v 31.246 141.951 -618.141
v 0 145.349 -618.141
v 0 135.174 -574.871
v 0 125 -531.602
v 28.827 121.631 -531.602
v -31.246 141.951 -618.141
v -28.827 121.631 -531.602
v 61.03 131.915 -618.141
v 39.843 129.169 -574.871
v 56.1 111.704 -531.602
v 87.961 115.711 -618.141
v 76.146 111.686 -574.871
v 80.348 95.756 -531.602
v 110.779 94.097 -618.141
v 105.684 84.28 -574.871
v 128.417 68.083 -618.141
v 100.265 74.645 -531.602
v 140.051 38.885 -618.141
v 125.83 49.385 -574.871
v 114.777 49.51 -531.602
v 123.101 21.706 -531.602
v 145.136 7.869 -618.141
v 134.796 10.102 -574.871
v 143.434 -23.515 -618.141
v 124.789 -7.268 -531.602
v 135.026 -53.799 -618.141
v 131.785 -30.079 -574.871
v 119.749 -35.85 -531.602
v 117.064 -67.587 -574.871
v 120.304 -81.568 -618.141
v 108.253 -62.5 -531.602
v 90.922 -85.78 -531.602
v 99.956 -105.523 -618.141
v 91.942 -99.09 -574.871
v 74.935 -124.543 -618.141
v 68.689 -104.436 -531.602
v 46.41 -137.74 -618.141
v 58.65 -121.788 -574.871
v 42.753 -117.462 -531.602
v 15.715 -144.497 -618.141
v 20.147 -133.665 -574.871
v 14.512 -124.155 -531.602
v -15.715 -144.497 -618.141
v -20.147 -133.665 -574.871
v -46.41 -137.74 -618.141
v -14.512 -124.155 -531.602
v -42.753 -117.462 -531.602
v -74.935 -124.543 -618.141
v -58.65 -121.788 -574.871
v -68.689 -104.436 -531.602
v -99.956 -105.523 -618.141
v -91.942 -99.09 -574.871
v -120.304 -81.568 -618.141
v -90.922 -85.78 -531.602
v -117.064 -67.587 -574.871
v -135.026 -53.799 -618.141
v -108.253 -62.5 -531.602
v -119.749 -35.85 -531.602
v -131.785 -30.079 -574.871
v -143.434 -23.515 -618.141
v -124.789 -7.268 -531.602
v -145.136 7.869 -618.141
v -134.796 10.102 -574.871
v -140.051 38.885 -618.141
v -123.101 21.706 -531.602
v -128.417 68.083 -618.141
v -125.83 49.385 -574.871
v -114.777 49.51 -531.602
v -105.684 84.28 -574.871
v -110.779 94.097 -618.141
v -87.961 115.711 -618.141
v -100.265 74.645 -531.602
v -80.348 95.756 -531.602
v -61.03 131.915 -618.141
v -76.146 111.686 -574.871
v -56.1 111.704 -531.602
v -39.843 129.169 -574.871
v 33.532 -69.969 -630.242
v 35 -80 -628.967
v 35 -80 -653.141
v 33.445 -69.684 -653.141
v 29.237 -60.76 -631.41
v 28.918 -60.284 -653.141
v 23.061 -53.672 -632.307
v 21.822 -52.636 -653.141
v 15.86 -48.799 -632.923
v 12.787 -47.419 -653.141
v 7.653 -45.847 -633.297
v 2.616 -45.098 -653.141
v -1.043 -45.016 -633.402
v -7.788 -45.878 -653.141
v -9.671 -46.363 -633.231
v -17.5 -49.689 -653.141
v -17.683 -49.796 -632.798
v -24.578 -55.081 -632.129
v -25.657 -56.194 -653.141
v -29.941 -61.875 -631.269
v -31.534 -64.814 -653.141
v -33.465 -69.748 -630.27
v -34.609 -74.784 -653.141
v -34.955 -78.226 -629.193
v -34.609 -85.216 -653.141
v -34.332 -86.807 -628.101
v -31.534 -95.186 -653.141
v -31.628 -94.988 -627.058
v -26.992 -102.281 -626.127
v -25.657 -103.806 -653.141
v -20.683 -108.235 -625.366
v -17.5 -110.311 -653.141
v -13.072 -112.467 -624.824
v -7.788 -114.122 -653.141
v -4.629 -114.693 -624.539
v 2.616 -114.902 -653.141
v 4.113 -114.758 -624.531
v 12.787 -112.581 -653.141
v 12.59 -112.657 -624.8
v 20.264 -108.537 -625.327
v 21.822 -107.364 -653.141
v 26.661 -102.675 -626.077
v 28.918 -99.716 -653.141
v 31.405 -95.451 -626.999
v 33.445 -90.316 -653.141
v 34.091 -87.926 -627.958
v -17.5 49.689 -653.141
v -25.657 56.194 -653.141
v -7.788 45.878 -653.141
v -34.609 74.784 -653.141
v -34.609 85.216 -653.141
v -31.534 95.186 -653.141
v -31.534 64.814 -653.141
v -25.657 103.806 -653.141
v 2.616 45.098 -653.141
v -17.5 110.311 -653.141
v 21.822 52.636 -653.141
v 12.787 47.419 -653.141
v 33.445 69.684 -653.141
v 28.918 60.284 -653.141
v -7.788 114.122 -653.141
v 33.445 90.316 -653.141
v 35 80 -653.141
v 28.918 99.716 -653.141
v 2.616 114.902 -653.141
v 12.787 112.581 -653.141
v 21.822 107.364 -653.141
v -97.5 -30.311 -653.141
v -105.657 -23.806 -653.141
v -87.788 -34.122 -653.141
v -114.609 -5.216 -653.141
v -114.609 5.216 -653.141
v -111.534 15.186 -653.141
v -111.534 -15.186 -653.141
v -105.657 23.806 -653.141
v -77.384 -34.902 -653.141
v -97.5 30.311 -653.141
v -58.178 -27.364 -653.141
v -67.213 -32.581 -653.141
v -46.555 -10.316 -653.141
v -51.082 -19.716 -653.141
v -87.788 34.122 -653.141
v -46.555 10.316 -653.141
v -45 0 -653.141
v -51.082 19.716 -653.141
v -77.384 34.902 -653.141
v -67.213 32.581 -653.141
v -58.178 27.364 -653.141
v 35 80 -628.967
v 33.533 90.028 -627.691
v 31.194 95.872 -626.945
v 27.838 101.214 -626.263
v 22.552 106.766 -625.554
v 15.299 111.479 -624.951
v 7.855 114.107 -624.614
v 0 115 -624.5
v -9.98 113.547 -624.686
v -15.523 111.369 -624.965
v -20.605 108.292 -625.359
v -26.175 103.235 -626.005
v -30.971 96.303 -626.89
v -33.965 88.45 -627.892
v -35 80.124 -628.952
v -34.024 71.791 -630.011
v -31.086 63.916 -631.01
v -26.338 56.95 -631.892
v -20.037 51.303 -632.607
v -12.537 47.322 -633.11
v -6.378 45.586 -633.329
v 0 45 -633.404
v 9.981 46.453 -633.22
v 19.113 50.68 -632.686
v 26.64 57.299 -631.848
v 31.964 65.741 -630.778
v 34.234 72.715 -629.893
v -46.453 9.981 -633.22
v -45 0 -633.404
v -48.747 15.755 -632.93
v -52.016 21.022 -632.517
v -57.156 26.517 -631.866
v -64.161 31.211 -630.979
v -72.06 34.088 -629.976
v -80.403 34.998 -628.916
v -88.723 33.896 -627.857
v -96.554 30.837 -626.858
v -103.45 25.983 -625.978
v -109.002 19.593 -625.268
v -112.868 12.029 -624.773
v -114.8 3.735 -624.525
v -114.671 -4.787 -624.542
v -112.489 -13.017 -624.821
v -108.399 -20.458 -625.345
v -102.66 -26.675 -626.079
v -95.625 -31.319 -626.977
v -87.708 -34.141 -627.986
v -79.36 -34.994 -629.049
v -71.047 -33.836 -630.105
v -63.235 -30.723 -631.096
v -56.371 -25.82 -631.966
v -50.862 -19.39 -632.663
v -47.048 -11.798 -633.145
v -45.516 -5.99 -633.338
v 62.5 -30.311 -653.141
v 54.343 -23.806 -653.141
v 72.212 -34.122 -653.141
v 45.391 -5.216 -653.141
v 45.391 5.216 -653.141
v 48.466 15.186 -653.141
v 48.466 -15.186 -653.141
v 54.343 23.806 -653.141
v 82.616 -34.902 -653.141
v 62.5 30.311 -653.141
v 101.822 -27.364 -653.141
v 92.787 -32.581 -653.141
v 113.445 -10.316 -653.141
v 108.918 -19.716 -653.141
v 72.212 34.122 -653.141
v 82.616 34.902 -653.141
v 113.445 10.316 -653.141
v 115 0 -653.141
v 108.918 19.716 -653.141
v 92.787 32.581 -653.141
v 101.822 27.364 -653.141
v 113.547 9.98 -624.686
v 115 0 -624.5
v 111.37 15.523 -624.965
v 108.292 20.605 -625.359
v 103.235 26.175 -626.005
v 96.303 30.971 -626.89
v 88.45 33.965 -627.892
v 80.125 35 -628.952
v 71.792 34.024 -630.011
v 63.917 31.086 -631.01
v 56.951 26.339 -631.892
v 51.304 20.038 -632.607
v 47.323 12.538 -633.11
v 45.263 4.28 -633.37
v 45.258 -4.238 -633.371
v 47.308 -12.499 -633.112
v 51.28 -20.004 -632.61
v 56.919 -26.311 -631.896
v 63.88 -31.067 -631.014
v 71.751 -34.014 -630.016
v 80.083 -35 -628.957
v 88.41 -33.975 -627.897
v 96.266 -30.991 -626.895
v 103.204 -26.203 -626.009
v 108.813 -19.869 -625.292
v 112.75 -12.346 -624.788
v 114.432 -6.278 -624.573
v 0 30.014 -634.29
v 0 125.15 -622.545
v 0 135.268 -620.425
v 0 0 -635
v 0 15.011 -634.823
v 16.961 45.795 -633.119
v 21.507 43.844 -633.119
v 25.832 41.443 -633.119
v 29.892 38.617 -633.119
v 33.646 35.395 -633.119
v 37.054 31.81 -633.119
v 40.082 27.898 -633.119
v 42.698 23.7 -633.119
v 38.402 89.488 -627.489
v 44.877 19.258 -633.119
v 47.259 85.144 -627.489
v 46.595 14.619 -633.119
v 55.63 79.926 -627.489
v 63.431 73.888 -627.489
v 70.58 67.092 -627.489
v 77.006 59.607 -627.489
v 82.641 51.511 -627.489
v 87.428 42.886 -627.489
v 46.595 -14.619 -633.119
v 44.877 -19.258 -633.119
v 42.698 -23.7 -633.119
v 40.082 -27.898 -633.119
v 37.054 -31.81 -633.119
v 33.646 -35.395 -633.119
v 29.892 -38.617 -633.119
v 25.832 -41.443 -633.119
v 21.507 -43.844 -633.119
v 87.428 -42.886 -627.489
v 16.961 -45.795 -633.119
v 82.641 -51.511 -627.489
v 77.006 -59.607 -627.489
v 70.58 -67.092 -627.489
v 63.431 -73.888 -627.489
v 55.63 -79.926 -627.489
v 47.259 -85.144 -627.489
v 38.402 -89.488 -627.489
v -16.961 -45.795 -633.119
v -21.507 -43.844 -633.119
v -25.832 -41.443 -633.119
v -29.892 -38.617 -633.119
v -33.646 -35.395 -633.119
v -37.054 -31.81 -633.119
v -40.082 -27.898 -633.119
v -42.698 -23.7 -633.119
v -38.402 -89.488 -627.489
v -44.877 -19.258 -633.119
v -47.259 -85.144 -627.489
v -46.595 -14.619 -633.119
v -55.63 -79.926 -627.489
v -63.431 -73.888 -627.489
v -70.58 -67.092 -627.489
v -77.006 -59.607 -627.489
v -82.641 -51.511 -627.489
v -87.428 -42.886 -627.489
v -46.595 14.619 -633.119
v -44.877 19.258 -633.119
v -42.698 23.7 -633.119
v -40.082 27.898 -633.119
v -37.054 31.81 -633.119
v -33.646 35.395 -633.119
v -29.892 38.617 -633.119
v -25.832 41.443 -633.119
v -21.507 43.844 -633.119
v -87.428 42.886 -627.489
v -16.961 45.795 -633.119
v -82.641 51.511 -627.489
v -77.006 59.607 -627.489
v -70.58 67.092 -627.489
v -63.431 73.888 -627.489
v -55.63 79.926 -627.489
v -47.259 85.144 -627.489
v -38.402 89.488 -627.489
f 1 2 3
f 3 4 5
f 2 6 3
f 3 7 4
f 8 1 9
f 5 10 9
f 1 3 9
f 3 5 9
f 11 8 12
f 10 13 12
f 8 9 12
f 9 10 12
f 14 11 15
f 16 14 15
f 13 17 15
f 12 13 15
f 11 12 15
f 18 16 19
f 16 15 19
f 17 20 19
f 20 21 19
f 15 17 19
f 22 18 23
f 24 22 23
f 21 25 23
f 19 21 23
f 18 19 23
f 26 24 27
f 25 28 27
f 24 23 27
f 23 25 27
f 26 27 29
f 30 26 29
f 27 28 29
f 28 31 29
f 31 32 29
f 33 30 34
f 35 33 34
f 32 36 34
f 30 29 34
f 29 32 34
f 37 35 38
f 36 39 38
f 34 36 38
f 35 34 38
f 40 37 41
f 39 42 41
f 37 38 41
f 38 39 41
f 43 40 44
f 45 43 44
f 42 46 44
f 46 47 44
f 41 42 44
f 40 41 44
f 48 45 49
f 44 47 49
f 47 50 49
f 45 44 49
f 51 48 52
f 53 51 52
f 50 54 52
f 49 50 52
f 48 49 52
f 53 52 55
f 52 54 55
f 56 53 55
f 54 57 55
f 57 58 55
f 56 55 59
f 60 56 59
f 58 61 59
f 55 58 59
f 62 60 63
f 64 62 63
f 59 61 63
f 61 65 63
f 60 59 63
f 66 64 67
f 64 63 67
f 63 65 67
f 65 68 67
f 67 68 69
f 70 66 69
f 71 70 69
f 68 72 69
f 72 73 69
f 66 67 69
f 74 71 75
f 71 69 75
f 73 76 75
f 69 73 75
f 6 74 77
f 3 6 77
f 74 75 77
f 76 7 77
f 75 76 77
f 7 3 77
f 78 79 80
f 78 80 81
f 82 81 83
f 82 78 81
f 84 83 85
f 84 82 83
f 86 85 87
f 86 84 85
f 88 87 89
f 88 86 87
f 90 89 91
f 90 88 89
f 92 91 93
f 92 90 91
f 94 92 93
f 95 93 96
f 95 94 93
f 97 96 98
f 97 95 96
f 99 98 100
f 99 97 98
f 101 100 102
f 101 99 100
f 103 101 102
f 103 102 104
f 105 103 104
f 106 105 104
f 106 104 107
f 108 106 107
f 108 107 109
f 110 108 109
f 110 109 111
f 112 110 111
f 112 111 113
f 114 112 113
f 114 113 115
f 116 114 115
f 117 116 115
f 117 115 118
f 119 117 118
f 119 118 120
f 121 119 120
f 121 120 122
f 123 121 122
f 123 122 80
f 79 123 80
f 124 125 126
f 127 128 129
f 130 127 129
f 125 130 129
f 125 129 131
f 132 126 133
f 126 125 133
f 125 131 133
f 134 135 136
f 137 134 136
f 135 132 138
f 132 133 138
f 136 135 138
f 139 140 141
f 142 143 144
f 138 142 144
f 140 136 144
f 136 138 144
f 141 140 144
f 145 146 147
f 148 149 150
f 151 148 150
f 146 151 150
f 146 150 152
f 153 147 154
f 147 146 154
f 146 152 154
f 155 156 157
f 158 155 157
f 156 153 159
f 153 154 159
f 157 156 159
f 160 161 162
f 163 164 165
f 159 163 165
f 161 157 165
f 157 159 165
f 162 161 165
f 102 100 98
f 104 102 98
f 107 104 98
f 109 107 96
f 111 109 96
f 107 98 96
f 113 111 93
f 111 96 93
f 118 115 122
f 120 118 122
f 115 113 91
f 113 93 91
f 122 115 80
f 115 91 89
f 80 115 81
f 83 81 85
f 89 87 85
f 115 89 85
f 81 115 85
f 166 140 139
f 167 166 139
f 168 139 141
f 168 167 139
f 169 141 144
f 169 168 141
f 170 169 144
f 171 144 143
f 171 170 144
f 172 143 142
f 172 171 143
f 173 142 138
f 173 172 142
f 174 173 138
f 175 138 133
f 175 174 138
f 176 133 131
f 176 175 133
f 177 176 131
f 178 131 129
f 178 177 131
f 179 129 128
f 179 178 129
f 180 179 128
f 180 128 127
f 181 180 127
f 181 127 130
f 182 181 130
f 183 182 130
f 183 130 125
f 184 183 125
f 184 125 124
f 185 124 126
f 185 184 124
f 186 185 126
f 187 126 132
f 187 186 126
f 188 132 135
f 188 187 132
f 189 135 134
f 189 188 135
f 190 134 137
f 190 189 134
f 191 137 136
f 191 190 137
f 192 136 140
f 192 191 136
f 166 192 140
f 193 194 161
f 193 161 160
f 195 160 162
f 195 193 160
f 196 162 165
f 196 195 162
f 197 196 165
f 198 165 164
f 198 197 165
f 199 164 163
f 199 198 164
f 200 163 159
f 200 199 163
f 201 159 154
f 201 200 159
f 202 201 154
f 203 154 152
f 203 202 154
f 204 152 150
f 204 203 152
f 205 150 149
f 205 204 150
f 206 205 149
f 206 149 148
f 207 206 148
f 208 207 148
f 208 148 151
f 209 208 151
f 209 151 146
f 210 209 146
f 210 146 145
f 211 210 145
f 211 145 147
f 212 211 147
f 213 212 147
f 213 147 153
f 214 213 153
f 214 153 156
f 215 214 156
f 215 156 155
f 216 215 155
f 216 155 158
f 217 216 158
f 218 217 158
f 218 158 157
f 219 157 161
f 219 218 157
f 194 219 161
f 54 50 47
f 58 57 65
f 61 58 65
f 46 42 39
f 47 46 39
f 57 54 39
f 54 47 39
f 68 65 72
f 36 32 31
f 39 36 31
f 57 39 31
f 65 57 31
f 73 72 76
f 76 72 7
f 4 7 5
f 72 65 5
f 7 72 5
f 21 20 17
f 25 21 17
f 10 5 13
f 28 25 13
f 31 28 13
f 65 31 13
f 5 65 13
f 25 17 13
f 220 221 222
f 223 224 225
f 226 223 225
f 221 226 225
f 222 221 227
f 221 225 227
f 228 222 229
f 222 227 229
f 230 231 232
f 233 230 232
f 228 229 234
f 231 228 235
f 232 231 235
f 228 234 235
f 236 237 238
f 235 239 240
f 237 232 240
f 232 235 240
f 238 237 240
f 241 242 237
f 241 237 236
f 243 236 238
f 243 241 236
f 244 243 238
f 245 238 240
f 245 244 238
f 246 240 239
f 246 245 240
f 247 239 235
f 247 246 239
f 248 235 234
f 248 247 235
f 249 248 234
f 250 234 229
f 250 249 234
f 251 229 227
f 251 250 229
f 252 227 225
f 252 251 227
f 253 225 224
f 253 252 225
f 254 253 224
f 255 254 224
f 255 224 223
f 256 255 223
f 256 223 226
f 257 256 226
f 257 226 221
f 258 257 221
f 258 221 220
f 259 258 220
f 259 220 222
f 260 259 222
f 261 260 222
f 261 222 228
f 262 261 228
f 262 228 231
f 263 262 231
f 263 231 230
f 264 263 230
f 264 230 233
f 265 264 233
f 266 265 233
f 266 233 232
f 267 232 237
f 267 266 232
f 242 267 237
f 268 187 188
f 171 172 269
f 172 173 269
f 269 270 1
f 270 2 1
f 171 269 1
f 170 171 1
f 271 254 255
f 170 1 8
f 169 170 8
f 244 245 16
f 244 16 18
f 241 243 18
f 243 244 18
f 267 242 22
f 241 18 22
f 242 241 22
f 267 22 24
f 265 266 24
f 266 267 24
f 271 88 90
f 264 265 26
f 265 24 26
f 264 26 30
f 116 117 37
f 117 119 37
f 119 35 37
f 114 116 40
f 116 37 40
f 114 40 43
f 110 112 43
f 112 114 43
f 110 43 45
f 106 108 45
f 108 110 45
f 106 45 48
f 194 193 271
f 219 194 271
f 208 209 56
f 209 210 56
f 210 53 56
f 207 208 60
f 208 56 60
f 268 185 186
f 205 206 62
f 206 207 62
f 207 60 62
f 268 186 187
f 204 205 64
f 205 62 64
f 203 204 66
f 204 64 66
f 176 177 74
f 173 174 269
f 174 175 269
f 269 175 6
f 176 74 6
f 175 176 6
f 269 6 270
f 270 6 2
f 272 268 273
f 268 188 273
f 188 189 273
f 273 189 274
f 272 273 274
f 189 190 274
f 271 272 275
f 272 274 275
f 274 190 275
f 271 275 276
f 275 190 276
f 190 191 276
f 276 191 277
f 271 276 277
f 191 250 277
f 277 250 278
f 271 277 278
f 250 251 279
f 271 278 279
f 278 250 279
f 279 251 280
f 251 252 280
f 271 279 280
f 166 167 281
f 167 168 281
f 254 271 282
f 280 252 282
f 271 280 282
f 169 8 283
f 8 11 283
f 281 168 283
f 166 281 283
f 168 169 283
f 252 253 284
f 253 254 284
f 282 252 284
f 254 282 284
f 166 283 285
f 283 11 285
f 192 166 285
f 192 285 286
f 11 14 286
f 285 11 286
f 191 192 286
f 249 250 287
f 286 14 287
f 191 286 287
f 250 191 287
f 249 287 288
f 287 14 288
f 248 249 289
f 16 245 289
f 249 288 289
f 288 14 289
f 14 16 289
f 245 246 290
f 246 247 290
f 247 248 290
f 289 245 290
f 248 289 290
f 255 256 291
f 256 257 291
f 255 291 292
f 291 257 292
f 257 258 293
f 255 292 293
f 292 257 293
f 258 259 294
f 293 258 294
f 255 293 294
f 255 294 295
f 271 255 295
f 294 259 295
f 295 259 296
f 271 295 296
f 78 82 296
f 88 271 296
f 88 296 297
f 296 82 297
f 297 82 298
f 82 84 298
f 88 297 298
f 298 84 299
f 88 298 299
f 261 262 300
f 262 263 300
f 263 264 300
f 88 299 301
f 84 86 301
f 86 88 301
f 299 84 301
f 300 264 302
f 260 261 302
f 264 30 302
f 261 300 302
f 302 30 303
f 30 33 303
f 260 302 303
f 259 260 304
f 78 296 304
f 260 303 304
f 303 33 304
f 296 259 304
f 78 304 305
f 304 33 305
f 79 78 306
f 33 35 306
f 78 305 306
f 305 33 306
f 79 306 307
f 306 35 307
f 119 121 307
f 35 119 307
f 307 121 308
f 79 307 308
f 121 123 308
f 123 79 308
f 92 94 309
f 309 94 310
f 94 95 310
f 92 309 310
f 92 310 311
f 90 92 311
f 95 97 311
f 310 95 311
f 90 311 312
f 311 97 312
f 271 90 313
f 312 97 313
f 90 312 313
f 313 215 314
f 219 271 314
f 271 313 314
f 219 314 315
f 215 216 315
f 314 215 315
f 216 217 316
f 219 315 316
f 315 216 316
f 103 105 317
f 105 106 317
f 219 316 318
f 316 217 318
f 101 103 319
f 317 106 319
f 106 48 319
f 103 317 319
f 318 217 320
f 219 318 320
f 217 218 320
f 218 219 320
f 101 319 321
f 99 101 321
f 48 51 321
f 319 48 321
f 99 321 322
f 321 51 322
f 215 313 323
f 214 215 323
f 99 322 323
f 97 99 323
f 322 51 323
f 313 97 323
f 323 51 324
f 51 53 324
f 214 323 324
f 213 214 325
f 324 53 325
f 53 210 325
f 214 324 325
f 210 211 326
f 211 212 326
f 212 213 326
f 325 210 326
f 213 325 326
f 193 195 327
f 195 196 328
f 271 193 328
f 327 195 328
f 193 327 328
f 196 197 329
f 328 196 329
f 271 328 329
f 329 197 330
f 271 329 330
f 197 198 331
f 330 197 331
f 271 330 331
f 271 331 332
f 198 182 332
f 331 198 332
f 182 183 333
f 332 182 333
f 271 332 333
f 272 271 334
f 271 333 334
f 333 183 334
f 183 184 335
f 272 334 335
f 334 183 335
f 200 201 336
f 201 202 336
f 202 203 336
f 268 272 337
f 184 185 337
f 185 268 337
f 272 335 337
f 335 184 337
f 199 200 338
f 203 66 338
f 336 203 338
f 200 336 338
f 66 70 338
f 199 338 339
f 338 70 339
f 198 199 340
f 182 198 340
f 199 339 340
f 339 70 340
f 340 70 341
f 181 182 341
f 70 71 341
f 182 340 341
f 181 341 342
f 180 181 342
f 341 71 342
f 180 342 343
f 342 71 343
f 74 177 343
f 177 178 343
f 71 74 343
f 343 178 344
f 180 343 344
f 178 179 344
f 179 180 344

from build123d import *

# Parameters (mm, degrees)
CABLES_SKETCH_R = 35
CABLES_DEPTH    = 35


with BuildPart() as part:
    # Big Plug Sketch → Big Plug (revolve)
    with BuildSketch(Plane(origin=(0, 0, 0), x_dir=(0, 0, -1), z_dir=(1, 0, 0))):
        with BuildLine():
            Line((531.601551916, 125), (531.601551916, 0))
            Line((531.601551916, 0), (635, 0))
            ThreePointArc((635, 0), (630.771254316, 73.161634266), (618.141339438, 145.348837209))
            Line((618.141339438, 145.348837209), (531.601551916, 125))
        make_face()
    revolve(axis=Axis((0, 0, 0), (0, 0, -1)))

    # Cables Sketch → Cables (add)
    with BuildSketch(Plane.XY.offset(-618.141339438)):
        with Locations((0, 80)):
            Circle(CABLES_SKETCH_R)
        with Locations((80, 0)):
            Circle(CABLES_SKETCH_R)
        with Locations((0, -80)):
            Circle(CABLES_SKETCH_R)
        with Locations((-80, 0)):
            Circle(CABLES_SKETCH_R)
    extrude(amount=-CABLES_DEPTH)


solid = part.part
